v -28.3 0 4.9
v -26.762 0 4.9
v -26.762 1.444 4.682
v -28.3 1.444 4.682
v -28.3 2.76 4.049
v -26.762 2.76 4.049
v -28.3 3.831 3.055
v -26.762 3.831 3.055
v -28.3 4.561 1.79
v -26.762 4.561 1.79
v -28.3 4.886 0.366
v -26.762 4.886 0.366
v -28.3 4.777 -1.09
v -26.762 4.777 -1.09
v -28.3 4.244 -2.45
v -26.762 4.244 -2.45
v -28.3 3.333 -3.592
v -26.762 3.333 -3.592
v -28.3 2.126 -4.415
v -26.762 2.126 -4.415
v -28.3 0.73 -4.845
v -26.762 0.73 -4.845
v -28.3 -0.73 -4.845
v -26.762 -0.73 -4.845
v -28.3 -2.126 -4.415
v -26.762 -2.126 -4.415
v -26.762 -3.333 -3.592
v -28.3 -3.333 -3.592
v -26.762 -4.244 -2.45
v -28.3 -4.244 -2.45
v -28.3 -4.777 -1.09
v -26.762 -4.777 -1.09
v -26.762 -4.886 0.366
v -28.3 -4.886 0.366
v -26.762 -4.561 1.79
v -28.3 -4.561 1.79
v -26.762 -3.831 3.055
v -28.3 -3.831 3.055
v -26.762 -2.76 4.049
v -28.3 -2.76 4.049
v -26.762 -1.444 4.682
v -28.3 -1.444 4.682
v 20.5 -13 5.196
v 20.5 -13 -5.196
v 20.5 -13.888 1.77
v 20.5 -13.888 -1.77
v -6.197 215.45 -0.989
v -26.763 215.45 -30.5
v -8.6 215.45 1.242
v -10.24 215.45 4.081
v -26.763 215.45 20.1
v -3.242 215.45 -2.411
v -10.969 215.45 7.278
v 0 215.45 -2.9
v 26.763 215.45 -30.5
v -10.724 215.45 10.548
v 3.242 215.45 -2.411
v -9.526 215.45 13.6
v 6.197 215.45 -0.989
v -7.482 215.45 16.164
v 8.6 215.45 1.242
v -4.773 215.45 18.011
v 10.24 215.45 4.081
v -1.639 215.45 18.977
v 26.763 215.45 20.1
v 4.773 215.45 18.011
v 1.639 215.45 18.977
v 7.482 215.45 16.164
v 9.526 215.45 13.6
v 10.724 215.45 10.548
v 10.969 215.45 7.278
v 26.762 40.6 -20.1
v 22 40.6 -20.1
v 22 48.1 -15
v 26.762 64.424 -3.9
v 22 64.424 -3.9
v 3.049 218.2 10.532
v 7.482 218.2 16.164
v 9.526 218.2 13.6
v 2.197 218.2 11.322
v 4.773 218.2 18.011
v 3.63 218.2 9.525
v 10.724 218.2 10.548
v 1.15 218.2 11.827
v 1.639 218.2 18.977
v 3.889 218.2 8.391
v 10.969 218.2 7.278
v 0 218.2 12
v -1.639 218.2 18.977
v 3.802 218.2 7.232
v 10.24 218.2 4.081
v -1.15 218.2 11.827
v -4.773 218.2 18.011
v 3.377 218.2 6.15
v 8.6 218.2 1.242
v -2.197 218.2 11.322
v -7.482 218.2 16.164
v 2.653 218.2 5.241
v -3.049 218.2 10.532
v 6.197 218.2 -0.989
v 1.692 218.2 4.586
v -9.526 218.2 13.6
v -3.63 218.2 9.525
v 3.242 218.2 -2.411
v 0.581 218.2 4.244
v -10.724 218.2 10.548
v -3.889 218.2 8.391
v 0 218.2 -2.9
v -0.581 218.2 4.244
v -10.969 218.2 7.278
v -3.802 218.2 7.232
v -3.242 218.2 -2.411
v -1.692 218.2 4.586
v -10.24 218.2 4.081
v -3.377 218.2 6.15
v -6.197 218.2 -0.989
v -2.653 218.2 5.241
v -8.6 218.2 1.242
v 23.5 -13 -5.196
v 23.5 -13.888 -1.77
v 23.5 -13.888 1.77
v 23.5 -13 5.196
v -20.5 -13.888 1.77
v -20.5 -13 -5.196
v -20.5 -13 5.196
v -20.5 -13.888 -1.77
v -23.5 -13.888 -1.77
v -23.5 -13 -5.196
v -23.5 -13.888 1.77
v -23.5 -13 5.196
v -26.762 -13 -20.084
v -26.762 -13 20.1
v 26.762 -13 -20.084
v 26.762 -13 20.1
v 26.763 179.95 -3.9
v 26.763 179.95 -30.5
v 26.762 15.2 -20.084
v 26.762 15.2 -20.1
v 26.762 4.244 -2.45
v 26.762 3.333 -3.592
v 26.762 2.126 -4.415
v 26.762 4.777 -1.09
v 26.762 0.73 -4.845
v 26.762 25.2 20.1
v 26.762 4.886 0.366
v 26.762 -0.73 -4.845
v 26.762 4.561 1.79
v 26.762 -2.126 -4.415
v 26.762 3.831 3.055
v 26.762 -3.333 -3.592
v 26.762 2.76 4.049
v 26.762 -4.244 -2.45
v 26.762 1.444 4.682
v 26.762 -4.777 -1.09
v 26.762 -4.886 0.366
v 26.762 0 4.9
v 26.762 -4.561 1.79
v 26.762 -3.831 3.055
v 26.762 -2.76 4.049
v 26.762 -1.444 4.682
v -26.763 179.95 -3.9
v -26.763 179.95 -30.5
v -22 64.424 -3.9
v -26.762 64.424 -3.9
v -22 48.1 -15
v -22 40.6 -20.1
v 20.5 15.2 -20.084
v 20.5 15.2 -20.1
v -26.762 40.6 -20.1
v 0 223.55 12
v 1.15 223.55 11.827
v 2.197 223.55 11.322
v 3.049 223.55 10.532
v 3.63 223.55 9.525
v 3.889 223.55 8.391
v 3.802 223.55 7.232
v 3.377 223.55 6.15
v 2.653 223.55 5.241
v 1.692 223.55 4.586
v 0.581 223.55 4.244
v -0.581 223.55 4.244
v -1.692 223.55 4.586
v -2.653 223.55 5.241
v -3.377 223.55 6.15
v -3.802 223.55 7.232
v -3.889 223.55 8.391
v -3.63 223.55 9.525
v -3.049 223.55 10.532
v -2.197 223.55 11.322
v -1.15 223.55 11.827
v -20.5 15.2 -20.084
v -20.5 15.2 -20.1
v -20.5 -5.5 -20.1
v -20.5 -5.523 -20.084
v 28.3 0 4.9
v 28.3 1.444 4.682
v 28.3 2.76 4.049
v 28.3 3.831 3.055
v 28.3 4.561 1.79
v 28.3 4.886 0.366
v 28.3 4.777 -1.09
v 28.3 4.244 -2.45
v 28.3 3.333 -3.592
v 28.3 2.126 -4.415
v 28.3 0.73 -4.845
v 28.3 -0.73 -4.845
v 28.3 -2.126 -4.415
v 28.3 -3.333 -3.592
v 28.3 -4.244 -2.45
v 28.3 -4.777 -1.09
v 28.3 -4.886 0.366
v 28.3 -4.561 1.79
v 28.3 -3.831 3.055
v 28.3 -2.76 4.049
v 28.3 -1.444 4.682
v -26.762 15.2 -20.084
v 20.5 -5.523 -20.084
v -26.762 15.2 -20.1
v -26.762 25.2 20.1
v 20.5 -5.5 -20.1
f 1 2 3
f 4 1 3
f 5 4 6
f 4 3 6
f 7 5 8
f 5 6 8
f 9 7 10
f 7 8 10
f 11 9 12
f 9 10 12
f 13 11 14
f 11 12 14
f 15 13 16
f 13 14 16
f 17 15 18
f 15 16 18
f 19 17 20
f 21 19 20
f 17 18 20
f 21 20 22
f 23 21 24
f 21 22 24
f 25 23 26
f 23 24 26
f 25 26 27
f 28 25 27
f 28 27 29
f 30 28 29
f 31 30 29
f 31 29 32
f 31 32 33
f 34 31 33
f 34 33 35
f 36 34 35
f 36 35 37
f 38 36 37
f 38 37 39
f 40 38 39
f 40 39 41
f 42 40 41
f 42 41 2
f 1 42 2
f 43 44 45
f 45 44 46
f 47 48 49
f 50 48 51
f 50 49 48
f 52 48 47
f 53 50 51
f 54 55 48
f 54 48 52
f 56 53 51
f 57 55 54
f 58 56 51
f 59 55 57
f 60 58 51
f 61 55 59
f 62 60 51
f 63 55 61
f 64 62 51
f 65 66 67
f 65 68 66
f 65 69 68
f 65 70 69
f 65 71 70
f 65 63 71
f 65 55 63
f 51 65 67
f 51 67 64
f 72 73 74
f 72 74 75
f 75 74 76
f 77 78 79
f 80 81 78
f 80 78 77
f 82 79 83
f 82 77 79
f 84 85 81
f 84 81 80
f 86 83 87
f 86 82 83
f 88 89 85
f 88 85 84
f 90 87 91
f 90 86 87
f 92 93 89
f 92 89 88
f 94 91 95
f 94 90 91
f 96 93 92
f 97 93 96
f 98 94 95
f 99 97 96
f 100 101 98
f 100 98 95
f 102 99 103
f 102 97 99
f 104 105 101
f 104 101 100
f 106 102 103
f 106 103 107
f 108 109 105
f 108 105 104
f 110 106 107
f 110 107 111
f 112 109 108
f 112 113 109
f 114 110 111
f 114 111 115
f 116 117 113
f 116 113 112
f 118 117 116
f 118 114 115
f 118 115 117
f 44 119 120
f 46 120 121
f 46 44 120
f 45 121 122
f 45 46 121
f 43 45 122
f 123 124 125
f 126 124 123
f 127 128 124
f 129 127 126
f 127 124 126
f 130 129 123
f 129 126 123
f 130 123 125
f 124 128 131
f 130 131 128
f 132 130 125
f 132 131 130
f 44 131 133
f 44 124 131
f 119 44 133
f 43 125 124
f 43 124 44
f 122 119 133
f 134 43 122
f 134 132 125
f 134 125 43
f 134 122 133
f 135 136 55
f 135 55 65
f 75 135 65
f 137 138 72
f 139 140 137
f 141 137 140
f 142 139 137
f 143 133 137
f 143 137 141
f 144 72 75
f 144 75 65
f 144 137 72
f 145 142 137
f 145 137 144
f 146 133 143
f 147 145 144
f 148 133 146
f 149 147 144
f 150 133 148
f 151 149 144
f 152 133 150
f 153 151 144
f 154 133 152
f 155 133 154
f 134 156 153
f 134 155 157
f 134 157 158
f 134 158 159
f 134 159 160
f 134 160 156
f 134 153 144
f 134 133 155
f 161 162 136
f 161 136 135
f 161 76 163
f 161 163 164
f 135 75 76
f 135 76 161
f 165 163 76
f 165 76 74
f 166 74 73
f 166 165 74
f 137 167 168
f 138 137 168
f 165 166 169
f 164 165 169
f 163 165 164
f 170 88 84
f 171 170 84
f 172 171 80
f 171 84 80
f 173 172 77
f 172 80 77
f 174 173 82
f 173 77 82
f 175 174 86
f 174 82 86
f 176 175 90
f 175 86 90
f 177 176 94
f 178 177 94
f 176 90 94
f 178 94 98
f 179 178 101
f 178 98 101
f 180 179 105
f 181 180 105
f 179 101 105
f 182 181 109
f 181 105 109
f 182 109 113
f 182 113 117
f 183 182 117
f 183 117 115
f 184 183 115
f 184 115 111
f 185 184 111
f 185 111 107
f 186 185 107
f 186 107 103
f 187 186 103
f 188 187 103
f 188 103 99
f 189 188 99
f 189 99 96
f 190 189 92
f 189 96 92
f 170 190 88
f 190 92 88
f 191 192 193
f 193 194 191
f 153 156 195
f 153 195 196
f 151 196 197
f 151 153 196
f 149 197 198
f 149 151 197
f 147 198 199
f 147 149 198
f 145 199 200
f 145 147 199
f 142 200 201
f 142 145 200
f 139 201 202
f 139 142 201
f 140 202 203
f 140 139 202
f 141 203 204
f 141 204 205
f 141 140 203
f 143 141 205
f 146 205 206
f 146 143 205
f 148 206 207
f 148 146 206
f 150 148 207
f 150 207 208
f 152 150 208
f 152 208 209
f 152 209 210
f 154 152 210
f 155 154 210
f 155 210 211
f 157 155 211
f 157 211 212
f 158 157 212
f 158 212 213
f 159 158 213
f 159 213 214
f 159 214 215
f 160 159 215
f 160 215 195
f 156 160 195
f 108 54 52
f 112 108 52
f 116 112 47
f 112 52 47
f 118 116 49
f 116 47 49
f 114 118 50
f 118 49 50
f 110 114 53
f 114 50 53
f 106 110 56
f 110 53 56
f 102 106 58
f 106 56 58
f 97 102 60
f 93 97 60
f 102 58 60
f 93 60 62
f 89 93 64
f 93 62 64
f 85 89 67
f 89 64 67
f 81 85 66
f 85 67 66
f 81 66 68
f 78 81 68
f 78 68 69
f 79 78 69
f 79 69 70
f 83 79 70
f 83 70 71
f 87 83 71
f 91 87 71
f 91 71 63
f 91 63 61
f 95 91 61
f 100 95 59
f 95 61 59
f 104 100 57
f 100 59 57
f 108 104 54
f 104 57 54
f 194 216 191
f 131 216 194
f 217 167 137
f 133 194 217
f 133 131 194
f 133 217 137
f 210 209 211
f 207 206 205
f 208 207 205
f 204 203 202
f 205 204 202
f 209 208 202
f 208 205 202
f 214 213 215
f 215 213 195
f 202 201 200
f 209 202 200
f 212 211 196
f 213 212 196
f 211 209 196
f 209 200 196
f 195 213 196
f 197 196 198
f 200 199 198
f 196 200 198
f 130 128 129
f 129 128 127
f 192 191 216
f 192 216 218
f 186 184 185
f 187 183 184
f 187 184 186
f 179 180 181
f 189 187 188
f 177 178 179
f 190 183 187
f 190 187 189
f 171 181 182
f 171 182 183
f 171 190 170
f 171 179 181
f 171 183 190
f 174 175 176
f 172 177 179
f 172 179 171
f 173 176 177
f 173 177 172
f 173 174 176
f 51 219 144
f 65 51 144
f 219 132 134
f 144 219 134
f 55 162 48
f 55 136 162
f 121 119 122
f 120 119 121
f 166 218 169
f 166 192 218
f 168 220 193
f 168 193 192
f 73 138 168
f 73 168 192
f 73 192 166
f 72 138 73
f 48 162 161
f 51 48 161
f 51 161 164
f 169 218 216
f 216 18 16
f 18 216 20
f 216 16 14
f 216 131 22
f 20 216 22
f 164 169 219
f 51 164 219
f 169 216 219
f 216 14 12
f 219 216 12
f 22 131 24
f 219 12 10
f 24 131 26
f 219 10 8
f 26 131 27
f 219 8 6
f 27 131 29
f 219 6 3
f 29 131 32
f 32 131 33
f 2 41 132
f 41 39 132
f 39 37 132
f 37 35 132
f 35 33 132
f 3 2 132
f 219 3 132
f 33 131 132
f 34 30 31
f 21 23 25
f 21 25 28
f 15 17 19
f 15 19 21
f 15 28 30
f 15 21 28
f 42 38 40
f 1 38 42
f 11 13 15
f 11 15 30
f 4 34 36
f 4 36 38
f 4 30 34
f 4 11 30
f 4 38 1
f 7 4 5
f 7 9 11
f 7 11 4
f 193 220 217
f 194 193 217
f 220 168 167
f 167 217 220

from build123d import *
from OCP.BRepFilletAPI import BRepFilletAPI_MakeChamfer

# Parameters (mm, degrees)
SKETCH1_W            = 41
SKETCH1_H            = 40.2
BOSS_EXTRUDE1_DEPTH  = 61.1
SKETCH2_R            = 14
BOSS_EXTRUDE2_DEPTH  = 3
SKETCH3_R            = 4.9
BOSS_EXTRUDE3_DEPTH  = 4.8
CHAMFER1_SIZE        = 7.5
CHAMFER1_SIZE2       = 5.1
MIRROR5_START        = -20.5
MIRROR5_DEPTH        = 41
BOSS_EXTRUDE4_DEPTH  = 1.5
BOSS_EXTRUDE5_DEPTH  = 4.7625
SKETCH7_W            = 35.6
SKETCH7_H            = 50.6
BOSS_EXTRUDE6_DEPTH  = 35.5
SKETCH9_W            = 29.5
SKETCH9_H            = 35
BOSS_EXTRUDE7_DEPTH  = 39.8
SKETCH10_R           = 11
BOSS_EXTRUDE8_DEPTH  = 2.75
SKETCH11_R           = 3.9
BOSS_EXTRUDE9_DEPTH  = 5.35
SKETCH12_W           = 50.6
SKETCH12_H           = 35.5
BOSS_EXTRUDE10_DEPTH = 8.9625
SKETCH13_W           = 50.6
SKETCH13_H           = 35.5
BOSS_EXTRUDE11_DEPTH = 8.9625
SKETCH14_W           = 53.520973266
SKETCH14_H           = 24
BOSS_EXTRUDE12_DEPTH = 131.85
SKETCH15_W           = 53.525
SKETCH15_H           = 28.80973019
BOSS_EXTRUDE13_DEPTH = 10
SKETCH16_W           = 44
SKETCH16_H           = 7.5
BOSS_EXTRUDE14_DEPTH = 10
SKETCH17_W           = 53.525
SKETCH17_H           = 40.184191337
BOSS_EXTRUDE15_DEPTH = 44


# Read off the part's stored shape, not the designer's step: Mirror5
with BuildPart() as part:
    # Sketch1 → Boss-Extrude1 (new body)
    with BuildSketch(Plane(origin=(0, -13, 0), x_dir=(-1, 0, 0), z_dir=(0, 1, 0))):
        Rectangle(SKETCH1_W, SKETCH1_H)
    extrude(amount=BOSS_EXTRUDE1_DEPTH)

    # Sketch2 → Boss-Extrude2 (add)
    with BuildSketch(Plane.ZY.offset(20.5)):
        with Locations(Location((0, 0, 0), (0, 0, 248.213210702))):
            Circle(SKETCH2_R)
    boss_extrude2 = extrude(amount=BOSS_EXTRUDE2_DEPTH)

    # Sketch3 → Boss-Extrude3 (add)
    with BuildSketch(Plane.ZY.offset(23.5)):
        Circle(SKETCH3_R)
    boss_extrude3 = extrude(amount=BOSS_EXTRUDE3_DEPTH)

    # Chamfer1: one chamfer whose edges measure the first distance from different faces: ONE call of the kernel's chamfer builder (chamfer() names one face for all edges)
    chamfer1_edges_1 = [part.edges().sort_by_distance(p)[0] for p in [
        (0, 48.1, -20.1),
    ]]
    chamfer1_side_1 = [part.faces().sort_by_distance(p)[0] for p in [
        (0, 17.55, -20.1),
    ]]
    chamfer1_edges_2 = [part.edges().sort_by_distance(p)[0] for p in [
        (0, 48.1, 20.1),
    ]]
    chamfer1_side_2 = [part.faces().sort_by_distance(p)[0] for p in [
        (0, 17.55, 20.1),
    ]]
    chamfer1 = BRepFilletAPI_MakeChamfer(part.part.solid().wrapped)
    for e in chamfer1_edges_1:
        chamfer1.Add(CHAMFER1_SIZE, CHAMFER1_SIZE2, e.wrapped, chamfer1_side_1[0].wrapped)  # the first distance lies on this face
    for e in chamfer1_edges_2:
        chamfer1.Add(CHAMFER1_SIZE, CHAMFER1_SIZE2, e.wrapped, chamfer1_side_2[0].wrapped)  # the first distance lies on this face
    add(Compound.cast(chamfer1.Shape()), mode=Mode.REPLACE)

    # Mirror5 outline → Mirror5 (cut)
    with BuildSketch(Plane.YZ.offset(MIRROR5_START)):
        Polygon((-13, 20.1), (-13, 15), (-5.5, 20.1), align=None)
        Polygon((-5.5, -20.1), (-13, -15), (-13, -20.1), align=None)
    extrude(amount=MIRROR5_DEPTH, mode=Mode.SUBTRACT)

    # Sketch4 → Boss-Extrude4 (add)
    with BuildSketch(Plane.ZY.offset(20.5)):
        Polygon((-20.1, 15.2), (20.1, 15.2), (20.1, 40.6), (15, 48.1), (-15, 48.1), (-20.1, 40.6), align=None)
    boss_extrude4 = extrude(amount=BOSS_EXTRUDE4_DEPTH)

    # Mirror1: Boss-Extrude2, Boss-Extrude3, Boss-Extrude4 across plane
    add(boss_extrude2.mirror(Plane(origin=(0, 0, 0), x_dir=(0, 0, 1), z_dir=(1, 0, 0))))
    add(boss_extrude3.mirror(Plane(origin=(0, 0, 0), x_dir=(0, 0, 1), z_dir=(1, 0, 0))))
    add(boss_extrude4.mirror(Plane(origin=(0, 0, 0), x_dir=(0, 0, 1), z_dir=(1, 0, 0))))

    # Sketch6 → Boss-Extrude5 (add)
    with BuildSketch(Plane(origin=(22, 0, 0), x_dir=(0, 0, -1), z_dir=(1, 0, 0))):
        Polygon((20.1, 15.2), (20.1, 40.6), (3.9, 64.423529412), (3.9, 215.2), (-20.1, 215.2), (-20.1, 25.2), (4.9, 15.2), align=None)
    boss_extrude5 = extrude(amount=BOSS_EXTRUDE5_DEPTH)

    # Mirror2: Boss-Extrude5 across plane
    add(boss_extrude5.mirror(Plane(origin=(0, 0, 0), x_dir=(0, 0, 1), z_dir=(1, 0, 0))))



with BuildPart() as body_2:
    # Sketch7 → Boss-Extrude6 (new body)
    with BuildSketch(Plane(origin=(0, 215.45, 0), x_dir=(-1, 0, 0), z_dir=(0, 1, 0))):
        with Locations((0, -5.2)):
            Rectangle(SKETCH7_W, SKETCH7_H)
    extrude(amount=-BOSS_EXTRUDE6_DEPTH)


with BuildPart() as part_1:
    add(part.part)

    add(body_2.part)  # Boss-Extrude7 merges body 2
    # Sketch9 → Boss-Extrude7 (add)
    with BuildSketch(Plane.ZY.offset(-22)):
        with Locations((5.35, 197.7)):
            Rectangle(SKETCH9_W, SKETCH9_H)
    boss_extrude7 = extrude(amount=BOSS_EXTRUDE7_DEPTH)

    # Mirror3: Boss-Extrude7 across plane
    add(boss_extrude7.mirror(Plane(origin=(0, 0, 0), x_dir=(0, 0, 1), z_dir=(1, 0, 0))))

    # Sketch10 → Boss-Extrude8 (add)
    with BuildSketch(Plane(origin=(0, 215.45, 0), x_dir=(-1, 0, 0), z_dir=(0, 1, 0))):
        with Locations(Location((0, 8.1, 0), (0, 0, 270))):
            Circle(SKETCH10_R)
    extrude(amount=BOSS_EXTRUDE8_DEPTH)

    # Sketch11 → Boss-Extrude9 (add)
    with BuildSketch(Plane(origin=(0, 218.2, 0), x_dir=(-1, 0, 0), z_dir=(0, 1, 0))):
        with Locations(Location((0, 8.1, 0), (0, 0, 90))):
            Circle(SKETCH11_R)
    extrude(amount=BOSS_EXTRUDE9_DEPTH)

    # Sketch12 → Boss-Extrude10 (add)
    with BuildSketch(Plane(origin=(17.8, 0, 0), x_dir=(0, 0, -1), z_dir=(1, 0, 0))):
        with Locations((5.2, 197.7)):
            Rectangle(SKETCH12_W, SKETCH12_H)
    extrude(amount=BOSS_EXTRUDE10_DEPTH)

    # Sketch13 → Boss-Extrude11 (add)
    with BuildSketch(Plane.ZY.offset(17.8)):
        with Locations((-5.2, 197.7)):
            Rectangle(SKETCH13_W, SKETCH13_H)
    extrude(amount=BOSS_EXTRUDE11_DEPTH)

    # Sketch14 → Boss-Extrude12 (add)
    with BuildSketch(Plane.XZ.offset(-179.95)):
        with Locations((-0.002013367, 8.1)):
            Rectangle(SKETCH14_W, SKETCH14_H)
    extrude(amount=BOSS_EXTRUDE12_DEPTH)

    # Sketch15 → Boss-Extrude13 (add)
    with BuildSketch(Plane(origin=(0, 22.183698031, -32.623085339), x_dir=(-1, 0, 0), z_dir=(0, 0.562310021407278, -0.826926502069529))):
        with Locations((0, 36.675649649)):
            Rectangle(SKETCH15_W, SKETCH15_H)
    extrude(amount=-BOSS_EXTRUDE13_DEPTH)

    # Sketch16 → Boss-Extrude14 (add)
    with BuildSketch(Plane.XY.offset(20.1)):
        with Locations((0, 44.35)):
            Rectangle(SKETCH16_W, SKETCH16_H)
    extrude(amount=-BOSS_EXTRUDE14_DEPTH)

    # Sketch17 → Boss-Extrude15 (add)
    with BuildSketch(Plane.XZ.offset(13)):
        with Locations((0, 0.007904332)):
            Rectangle(SKETCH17_W, SKETCH17_H)
    extrude(amount=-BOSS_EXTRUDE15_DEPTH)


solid = part_1.part
